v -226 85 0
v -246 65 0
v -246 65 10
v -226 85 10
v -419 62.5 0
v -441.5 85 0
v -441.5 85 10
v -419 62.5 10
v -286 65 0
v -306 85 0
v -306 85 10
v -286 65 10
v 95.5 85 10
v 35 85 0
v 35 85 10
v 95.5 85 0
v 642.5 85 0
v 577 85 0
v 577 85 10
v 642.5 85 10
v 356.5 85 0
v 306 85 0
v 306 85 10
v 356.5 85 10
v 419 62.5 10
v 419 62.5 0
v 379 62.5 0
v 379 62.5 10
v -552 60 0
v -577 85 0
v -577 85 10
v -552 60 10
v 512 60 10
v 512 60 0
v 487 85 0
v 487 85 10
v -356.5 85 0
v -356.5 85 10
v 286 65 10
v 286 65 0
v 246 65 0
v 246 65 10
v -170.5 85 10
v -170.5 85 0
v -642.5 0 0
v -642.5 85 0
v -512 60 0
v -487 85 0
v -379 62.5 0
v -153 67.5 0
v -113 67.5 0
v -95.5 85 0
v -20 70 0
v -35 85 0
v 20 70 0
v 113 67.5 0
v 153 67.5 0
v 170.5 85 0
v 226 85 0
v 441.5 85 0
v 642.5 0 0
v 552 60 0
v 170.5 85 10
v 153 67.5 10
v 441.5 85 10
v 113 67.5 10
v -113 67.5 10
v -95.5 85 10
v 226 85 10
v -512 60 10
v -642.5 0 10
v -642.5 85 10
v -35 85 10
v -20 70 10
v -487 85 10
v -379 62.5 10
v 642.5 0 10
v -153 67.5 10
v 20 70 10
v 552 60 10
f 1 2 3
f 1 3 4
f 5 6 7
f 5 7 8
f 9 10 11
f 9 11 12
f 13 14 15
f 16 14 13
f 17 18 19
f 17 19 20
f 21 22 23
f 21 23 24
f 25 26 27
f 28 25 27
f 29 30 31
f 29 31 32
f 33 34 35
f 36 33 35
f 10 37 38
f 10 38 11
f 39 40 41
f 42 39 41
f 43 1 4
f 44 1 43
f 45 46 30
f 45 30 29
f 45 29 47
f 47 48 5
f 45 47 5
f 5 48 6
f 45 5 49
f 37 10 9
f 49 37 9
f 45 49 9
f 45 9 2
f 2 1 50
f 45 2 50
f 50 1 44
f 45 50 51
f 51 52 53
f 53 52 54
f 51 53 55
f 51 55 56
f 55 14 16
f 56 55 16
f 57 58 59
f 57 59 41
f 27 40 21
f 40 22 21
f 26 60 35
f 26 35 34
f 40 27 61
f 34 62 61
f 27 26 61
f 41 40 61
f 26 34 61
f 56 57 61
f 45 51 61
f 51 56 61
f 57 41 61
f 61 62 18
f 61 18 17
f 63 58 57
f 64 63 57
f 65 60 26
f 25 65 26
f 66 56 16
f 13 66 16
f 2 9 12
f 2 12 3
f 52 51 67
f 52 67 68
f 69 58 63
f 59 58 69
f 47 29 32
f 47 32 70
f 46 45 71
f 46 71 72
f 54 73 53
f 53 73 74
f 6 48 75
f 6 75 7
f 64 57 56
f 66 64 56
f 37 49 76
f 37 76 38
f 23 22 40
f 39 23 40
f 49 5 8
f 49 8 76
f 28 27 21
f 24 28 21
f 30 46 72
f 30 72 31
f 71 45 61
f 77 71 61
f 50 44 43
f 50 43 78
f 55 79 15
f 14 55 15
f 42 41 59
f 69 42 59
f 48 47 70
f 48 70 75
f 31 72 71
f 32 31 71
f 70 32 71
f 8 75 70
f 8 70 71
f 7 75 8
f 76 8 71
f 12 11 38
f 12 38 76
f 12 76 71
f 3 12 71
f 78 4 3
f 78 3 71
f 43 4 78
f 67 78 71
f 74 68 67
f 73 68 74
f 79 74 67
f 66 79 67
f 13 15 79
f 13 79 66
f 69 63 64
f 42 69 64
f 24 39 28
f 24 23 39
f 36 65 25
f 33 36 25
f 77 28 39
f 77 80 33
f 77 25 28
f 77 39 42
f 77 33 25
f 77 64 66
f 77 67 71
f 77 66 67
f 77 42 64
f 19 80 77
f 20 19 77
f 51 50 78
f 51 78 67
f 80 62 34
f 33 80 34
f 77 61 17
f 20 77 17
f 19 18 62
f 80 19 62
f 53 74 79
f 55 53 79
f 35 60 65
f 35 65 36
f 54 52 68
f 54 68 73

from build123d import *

# Parameters (mm, degrees)
SKETCH1_W             = 1285
SKETCH1_H             = 85
BOSS_EXTRUDE1_DEPTH   = 10
CUT_EXTRUDE1_REACH    = 650.175
SKETCH_PATTERN1_DEPTH = 10


# Read off the part's stored shape, not the designer's step: Sketch-Pattern1
with BuildPart() as part:
    # Sketch1 → Boss-Extrude1 (new body)
    with BuildSketch(Plane.XY):
        with Locations((0, 42.5)):
            Rectangle(SKETCH1_W, SKETCH1_H)
    extrude(amount=BOSS_EXTRUDE1_DEPTH)

    # Sketch2 → Cut-Extrude1 (cut, up to next)
    with BuildSketch(Plane.XY.offset(10), mode=Mode.PRIVATE) as cut_extrude1_sk1:
        Polygon((-50, 100), (-20, 70), (20, 70), (50, 100), align=None)
    cut_extrude1_tool1 = extrude(cut_extrude1_sk1.sketch, amount=-CUT_EXTRUDE1_REACH, mode=Mode.PRIVATE) & part.part
    add(cut_extrude1_tool1.solids().sort_by_distance((0, 87.142857, 10))[0], mode=Mode.SUBTRACT)

    # Sketch-Pattern1 outline → Sketch-Pattern1 (cut)
    with BuildSketch(Plane.XY):
        Polygon((-286, 65), (-246, 65), (-226, 85), (-306, 85), align=None)
        Polygon((-512, 60), (-487, 85), (-577, 85), (-552, 60), align=None)
        Polygon((-379, 62.5), (-356.5, 85), (-441.5, 85), (-419, 62.5), align=None)
        Polygon((-95.5, 85), (-170.5, 85), (-153, 67.5), (-113, 67.5), align=None)
    sketch_pattern1 = extrude(amount=SKETCH_PATTERN1_DEPTH, mode=Mode.SUBTRACT)

    # Mirror1: Sketch-Pattern1 across plane
    add(sketch_pattern1.mirror(Plane(origin=(0, 0, 0), x_dir=(0, 0, 1), z_dir=(1, 0, 0))), mode=Mode.SUBTRACT)


solid = part.part
